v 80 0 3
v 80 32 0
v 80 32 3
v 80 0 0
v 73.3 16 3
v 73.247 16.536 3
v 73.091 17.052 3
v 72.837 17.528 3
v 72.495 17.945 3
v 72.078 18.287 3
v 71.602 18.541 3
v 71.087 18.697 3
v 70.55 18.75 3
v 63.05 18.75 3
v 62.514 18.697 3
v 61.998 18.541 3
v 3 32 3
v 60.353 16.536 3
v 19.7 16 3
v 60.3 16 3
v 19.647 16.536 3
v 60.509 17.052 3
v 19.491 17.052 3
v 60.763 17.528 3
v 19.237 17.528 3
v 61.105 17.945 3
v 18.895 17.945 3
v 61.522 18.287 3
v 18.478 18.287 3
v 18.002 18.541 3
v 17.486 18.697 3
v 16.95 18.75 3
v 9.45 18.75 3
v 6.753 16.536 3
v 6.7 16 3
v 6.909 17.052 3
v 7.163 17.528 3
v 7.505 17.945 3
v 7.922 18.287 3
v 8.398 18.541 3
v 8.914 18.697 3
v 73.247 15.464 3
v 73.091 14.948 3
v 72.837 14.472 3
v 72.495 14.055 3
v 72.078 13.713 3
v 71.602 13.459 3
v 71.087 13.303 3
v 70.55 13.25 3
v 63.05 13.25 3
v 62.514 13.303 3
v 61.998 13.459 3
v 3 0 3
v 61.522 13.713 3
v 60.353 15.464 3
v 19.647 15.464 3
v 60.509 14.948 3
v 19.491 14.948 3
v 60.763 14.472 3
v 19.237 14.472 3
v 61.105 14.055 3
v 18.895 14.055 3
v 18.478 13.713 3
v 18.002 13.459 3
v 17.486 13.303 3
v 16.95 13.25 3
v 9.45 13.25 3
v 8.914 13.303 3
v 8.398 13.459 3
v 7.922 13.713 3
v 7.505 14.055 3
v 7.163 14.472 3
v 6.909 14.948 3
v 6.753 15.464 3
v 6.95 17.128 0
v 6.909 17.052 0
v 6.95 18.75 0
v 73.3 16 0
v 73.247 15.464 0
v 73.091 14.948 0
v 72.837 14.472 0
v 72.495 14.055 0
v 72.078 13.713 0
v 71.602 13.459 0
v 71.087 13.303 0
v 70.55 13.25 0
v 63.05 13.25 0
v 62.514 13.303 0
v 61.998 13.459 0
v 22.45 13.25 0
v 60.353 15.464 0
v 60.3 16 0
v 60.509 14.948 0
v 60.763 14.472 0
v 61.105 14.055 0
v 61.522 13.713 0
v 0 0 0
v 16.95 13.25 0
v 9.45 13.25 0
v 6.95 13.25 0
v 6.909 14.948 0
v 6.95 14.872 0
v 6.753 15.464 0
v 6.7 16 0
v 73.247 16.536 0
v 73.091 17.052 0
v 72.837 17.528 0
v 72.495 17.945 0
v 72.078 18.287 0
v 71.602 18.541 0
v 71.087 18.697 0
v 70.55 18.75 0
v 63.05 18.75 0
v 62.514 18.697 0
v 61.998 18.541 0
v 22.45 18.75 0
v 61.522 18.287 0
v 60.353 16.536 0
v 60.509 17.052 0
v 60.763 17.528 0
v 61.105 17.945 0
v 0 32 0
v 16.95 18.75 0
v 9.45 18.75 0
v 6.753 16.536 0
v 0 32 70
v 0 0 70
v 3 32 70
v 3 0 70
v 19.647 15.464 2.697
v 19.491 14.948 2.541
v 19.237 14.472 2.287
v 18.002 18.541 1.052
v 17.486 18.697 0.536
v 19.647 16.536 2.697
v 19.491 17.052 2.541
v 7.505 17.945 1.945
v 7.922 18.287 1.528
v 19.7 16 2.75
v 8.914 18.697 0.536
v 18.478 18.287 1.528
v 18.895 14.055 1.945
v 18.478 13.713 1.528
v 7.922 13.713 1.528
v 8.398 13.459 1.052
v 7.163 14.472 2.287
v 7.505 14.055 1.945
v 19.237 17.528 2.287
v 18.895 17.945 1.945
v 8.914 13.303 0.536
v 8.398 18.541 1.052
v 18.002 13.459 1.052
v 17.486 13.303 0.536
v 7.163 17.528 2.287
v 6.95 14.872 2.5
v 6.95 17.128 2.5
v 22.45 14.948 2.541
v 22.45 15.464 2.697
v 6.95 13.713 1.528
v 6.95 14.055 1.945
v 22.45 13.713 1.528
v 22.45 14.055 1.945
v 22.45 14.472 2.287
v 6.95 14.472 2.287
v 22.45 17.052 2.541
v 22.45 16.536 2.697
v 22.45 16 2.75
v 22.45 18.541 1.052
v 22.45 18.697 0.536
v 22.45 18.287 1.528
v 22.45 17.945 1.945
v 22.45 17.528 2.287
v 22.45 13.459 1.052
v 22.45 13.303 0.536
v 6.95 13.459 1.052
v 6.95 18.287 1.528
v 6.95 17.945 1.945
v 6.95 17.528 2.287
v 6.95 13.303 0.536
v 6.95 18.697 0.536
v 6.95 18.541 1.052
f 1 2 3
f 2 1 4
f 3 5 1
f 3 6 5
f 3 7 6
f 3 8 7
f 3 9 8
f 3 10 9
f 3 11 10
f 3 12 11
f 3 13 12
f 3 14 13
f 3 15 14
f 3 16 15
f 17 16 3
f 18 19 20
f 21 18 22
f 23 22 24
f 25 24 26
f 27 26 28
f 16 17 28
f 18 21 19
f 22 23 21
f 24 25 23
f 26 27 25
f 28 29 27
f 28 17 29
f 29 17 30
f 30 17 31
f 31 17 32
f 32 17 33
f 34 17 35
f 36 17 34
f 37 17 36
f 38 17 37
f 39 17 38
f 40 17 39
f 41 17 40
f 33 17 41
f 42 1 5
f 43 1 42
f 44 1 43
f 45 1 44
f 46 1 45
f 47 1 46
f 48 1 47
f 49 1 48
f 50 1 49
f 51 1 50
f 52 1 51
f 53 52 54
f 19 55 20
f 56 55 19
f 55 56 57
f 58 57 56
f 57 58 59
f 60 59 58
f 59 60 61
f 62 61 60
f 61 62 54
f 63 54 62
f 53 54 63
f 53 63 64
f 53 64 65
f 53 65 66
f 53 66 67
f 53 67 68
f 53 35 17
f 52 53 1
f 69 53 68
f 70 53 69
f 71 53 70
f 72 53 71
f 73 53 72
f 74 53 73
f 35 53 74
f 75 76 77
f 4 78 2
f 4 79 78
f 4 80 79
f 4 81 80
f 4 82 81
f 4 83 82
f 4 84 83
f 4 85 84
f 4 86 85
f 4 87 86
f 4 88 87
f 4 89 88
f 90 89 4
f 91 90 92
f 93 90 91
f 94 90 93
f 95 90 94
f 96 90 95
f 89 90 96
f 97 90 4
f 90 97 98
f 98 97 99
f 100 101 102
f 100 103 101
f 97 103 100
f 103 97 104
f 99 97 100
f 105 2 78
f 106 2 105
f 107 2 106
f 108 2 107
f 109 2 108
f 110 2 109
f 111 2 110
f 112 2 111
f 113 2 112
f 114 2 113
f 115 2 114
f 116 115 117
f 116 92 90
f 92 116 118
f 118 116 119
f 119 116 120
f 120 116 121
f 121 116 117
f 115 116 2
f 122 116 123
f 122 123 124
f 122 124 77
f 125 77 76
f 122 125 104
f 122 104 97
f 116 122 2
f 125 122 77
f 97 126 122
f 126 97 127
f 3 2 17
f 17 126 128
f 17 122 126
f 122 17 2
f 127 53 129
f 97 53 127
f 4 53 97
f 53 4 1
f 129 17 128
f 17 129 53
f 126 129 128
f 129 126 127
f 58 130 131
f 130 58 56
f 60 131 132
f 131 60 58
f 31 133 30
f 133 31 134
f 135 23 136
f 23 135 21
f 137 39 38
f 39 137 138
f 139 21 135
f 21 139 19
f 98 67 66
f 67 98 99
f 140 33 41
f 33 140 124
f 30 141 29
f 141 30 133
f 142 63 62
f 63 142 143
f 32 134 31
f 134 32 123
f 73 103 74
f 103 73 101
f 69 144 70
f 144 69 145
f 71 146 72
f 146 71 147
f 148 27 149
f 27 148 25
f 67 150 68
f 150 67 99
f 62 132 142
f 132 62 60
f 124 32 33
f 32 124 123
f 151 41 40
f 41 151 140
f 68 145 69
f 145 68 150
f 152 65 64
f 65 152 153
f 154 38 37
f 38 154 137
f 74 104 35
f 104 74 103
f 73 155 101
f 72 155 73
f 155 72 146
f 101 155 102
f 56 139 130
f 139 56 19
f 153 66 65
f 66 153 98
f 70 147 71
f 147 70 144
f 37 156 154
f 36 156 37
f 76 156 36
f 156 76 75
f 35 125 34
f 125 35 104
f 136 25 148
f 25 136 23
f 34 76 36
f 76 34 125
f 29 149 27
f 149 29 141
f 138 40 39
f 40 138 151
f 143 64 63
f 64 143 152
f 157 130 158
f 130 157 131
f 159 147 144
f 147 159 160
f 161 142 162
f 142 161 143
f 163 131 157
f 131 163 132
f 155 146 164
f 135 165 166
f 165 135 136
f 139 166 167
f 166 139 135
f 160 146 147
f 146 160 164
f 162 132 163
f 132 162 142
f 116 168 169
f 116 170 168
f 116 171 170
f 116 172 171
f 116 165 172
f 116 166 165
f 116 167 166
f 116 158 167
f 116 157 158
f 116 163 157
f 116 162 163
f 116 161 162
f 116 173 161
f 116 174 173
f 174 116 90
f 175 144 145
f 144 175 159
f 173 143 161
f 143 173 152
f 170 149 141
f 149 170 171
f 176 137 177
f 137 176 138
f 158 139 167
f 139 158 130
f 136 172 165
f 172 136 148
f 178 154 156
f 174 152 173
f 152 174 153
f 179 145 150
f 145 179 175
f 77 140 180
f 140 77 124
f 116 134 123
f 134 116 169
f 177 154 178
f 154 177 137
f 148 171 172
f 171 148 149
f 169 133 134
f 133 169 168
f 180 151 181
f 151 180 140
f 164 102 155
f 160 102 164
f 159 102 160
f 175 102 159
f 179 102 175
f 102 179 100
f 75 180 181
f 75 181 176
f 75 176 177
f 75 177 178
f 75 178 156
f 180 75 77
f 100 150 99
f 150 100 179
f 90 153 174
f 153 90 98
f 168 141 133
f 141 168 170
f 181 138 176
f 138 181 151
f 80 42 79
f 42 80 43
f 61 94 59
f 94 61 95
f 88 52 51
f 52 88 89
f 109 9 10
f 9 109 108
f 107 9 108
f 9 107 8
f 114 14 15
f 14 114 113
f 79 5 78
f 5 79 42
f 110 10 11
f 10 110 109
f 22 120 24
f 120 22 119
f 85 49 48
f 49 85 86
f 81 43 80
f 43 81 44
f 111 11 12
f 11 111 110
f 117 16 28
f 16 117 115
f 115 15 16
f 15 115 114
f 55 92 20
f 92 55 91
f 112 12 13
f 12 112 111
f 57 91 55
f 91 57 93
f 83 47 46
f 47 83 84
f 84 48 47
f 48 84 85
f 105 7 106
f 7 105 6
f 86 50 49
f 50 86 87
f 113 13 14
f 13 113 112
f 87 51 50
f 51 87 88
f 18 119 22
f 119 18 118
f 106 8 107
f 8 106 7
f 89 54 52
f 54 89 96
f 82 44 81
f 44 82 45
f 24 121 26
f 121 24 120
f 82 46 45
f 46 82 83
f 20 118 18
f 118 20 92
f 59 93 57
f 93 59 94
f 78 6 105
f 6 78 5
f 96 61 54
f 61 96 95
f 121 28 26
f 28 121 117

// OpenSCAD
$fn = 32;

// ----------------------------------------------------------------------
// L-bracket: 80 x 32 x 70 mm
// ----------------------------------------------------------------------

// --- parameters (mm) ---
horiz_len = 80;           // horizontal leg, X
vert_len = 70;            // vertical leg, Z
profile_w = 32;           // bracket depth, Y
plate_t = 3;              // plate thickness
hole_d = 6.6;             // clearance for M6
slot_w = 5.5;             // euro screw slot width
slot_l = 13;              // euro screw slot length

module hole_z(px, py) {
  translate([px, py, -2.5]) cylinder(h = plate_t + 5, d = hole_d);
}
module hole_x(pz, py) {
  translate([-2.5, py, pz]) rotate([0, 90, 0]) cylinder(h = plate_t + 5, d = hole_d);
}
module euro_slot_z(px, py) {
  hull() {
    translate([px - (slot_l - slot_w) / 2, py, -2.5]) cylinder(h = plate_t + 5, d = slot_w);
    translate([px + (slot_l - slot_w) / 2, py, -2.5]) cylinder(h = plate_t + 5, d = slot_w);
  }
}
module euro_slot_x(pz, py) {
  translate([-2.5, 0, 0]) rotate([0, 90, 0]) hull() {
    translate([0, py, pz - (slot_l - slot_w) / 2]) cylinder(h = plate_t + 5, d = slot_w);
    translate([0, py, pz + (slot_l - slot_w) / 2]) cylinder(h = plate_t + 5, d = slot_w);
  }
}

difference() {
  union() {
    /* horizontal leg */
    cube([horiz_len, profile_w, plate_t]);
    /* vertical leg, overlapping the corner block */
    cube([plate_t, profile_w, vert_len]);
  }
  euro_slot_z(13.2, 16);
  euro_slot_x(13.2, 16);
  euro_slot_z(66.8, 16);
}
